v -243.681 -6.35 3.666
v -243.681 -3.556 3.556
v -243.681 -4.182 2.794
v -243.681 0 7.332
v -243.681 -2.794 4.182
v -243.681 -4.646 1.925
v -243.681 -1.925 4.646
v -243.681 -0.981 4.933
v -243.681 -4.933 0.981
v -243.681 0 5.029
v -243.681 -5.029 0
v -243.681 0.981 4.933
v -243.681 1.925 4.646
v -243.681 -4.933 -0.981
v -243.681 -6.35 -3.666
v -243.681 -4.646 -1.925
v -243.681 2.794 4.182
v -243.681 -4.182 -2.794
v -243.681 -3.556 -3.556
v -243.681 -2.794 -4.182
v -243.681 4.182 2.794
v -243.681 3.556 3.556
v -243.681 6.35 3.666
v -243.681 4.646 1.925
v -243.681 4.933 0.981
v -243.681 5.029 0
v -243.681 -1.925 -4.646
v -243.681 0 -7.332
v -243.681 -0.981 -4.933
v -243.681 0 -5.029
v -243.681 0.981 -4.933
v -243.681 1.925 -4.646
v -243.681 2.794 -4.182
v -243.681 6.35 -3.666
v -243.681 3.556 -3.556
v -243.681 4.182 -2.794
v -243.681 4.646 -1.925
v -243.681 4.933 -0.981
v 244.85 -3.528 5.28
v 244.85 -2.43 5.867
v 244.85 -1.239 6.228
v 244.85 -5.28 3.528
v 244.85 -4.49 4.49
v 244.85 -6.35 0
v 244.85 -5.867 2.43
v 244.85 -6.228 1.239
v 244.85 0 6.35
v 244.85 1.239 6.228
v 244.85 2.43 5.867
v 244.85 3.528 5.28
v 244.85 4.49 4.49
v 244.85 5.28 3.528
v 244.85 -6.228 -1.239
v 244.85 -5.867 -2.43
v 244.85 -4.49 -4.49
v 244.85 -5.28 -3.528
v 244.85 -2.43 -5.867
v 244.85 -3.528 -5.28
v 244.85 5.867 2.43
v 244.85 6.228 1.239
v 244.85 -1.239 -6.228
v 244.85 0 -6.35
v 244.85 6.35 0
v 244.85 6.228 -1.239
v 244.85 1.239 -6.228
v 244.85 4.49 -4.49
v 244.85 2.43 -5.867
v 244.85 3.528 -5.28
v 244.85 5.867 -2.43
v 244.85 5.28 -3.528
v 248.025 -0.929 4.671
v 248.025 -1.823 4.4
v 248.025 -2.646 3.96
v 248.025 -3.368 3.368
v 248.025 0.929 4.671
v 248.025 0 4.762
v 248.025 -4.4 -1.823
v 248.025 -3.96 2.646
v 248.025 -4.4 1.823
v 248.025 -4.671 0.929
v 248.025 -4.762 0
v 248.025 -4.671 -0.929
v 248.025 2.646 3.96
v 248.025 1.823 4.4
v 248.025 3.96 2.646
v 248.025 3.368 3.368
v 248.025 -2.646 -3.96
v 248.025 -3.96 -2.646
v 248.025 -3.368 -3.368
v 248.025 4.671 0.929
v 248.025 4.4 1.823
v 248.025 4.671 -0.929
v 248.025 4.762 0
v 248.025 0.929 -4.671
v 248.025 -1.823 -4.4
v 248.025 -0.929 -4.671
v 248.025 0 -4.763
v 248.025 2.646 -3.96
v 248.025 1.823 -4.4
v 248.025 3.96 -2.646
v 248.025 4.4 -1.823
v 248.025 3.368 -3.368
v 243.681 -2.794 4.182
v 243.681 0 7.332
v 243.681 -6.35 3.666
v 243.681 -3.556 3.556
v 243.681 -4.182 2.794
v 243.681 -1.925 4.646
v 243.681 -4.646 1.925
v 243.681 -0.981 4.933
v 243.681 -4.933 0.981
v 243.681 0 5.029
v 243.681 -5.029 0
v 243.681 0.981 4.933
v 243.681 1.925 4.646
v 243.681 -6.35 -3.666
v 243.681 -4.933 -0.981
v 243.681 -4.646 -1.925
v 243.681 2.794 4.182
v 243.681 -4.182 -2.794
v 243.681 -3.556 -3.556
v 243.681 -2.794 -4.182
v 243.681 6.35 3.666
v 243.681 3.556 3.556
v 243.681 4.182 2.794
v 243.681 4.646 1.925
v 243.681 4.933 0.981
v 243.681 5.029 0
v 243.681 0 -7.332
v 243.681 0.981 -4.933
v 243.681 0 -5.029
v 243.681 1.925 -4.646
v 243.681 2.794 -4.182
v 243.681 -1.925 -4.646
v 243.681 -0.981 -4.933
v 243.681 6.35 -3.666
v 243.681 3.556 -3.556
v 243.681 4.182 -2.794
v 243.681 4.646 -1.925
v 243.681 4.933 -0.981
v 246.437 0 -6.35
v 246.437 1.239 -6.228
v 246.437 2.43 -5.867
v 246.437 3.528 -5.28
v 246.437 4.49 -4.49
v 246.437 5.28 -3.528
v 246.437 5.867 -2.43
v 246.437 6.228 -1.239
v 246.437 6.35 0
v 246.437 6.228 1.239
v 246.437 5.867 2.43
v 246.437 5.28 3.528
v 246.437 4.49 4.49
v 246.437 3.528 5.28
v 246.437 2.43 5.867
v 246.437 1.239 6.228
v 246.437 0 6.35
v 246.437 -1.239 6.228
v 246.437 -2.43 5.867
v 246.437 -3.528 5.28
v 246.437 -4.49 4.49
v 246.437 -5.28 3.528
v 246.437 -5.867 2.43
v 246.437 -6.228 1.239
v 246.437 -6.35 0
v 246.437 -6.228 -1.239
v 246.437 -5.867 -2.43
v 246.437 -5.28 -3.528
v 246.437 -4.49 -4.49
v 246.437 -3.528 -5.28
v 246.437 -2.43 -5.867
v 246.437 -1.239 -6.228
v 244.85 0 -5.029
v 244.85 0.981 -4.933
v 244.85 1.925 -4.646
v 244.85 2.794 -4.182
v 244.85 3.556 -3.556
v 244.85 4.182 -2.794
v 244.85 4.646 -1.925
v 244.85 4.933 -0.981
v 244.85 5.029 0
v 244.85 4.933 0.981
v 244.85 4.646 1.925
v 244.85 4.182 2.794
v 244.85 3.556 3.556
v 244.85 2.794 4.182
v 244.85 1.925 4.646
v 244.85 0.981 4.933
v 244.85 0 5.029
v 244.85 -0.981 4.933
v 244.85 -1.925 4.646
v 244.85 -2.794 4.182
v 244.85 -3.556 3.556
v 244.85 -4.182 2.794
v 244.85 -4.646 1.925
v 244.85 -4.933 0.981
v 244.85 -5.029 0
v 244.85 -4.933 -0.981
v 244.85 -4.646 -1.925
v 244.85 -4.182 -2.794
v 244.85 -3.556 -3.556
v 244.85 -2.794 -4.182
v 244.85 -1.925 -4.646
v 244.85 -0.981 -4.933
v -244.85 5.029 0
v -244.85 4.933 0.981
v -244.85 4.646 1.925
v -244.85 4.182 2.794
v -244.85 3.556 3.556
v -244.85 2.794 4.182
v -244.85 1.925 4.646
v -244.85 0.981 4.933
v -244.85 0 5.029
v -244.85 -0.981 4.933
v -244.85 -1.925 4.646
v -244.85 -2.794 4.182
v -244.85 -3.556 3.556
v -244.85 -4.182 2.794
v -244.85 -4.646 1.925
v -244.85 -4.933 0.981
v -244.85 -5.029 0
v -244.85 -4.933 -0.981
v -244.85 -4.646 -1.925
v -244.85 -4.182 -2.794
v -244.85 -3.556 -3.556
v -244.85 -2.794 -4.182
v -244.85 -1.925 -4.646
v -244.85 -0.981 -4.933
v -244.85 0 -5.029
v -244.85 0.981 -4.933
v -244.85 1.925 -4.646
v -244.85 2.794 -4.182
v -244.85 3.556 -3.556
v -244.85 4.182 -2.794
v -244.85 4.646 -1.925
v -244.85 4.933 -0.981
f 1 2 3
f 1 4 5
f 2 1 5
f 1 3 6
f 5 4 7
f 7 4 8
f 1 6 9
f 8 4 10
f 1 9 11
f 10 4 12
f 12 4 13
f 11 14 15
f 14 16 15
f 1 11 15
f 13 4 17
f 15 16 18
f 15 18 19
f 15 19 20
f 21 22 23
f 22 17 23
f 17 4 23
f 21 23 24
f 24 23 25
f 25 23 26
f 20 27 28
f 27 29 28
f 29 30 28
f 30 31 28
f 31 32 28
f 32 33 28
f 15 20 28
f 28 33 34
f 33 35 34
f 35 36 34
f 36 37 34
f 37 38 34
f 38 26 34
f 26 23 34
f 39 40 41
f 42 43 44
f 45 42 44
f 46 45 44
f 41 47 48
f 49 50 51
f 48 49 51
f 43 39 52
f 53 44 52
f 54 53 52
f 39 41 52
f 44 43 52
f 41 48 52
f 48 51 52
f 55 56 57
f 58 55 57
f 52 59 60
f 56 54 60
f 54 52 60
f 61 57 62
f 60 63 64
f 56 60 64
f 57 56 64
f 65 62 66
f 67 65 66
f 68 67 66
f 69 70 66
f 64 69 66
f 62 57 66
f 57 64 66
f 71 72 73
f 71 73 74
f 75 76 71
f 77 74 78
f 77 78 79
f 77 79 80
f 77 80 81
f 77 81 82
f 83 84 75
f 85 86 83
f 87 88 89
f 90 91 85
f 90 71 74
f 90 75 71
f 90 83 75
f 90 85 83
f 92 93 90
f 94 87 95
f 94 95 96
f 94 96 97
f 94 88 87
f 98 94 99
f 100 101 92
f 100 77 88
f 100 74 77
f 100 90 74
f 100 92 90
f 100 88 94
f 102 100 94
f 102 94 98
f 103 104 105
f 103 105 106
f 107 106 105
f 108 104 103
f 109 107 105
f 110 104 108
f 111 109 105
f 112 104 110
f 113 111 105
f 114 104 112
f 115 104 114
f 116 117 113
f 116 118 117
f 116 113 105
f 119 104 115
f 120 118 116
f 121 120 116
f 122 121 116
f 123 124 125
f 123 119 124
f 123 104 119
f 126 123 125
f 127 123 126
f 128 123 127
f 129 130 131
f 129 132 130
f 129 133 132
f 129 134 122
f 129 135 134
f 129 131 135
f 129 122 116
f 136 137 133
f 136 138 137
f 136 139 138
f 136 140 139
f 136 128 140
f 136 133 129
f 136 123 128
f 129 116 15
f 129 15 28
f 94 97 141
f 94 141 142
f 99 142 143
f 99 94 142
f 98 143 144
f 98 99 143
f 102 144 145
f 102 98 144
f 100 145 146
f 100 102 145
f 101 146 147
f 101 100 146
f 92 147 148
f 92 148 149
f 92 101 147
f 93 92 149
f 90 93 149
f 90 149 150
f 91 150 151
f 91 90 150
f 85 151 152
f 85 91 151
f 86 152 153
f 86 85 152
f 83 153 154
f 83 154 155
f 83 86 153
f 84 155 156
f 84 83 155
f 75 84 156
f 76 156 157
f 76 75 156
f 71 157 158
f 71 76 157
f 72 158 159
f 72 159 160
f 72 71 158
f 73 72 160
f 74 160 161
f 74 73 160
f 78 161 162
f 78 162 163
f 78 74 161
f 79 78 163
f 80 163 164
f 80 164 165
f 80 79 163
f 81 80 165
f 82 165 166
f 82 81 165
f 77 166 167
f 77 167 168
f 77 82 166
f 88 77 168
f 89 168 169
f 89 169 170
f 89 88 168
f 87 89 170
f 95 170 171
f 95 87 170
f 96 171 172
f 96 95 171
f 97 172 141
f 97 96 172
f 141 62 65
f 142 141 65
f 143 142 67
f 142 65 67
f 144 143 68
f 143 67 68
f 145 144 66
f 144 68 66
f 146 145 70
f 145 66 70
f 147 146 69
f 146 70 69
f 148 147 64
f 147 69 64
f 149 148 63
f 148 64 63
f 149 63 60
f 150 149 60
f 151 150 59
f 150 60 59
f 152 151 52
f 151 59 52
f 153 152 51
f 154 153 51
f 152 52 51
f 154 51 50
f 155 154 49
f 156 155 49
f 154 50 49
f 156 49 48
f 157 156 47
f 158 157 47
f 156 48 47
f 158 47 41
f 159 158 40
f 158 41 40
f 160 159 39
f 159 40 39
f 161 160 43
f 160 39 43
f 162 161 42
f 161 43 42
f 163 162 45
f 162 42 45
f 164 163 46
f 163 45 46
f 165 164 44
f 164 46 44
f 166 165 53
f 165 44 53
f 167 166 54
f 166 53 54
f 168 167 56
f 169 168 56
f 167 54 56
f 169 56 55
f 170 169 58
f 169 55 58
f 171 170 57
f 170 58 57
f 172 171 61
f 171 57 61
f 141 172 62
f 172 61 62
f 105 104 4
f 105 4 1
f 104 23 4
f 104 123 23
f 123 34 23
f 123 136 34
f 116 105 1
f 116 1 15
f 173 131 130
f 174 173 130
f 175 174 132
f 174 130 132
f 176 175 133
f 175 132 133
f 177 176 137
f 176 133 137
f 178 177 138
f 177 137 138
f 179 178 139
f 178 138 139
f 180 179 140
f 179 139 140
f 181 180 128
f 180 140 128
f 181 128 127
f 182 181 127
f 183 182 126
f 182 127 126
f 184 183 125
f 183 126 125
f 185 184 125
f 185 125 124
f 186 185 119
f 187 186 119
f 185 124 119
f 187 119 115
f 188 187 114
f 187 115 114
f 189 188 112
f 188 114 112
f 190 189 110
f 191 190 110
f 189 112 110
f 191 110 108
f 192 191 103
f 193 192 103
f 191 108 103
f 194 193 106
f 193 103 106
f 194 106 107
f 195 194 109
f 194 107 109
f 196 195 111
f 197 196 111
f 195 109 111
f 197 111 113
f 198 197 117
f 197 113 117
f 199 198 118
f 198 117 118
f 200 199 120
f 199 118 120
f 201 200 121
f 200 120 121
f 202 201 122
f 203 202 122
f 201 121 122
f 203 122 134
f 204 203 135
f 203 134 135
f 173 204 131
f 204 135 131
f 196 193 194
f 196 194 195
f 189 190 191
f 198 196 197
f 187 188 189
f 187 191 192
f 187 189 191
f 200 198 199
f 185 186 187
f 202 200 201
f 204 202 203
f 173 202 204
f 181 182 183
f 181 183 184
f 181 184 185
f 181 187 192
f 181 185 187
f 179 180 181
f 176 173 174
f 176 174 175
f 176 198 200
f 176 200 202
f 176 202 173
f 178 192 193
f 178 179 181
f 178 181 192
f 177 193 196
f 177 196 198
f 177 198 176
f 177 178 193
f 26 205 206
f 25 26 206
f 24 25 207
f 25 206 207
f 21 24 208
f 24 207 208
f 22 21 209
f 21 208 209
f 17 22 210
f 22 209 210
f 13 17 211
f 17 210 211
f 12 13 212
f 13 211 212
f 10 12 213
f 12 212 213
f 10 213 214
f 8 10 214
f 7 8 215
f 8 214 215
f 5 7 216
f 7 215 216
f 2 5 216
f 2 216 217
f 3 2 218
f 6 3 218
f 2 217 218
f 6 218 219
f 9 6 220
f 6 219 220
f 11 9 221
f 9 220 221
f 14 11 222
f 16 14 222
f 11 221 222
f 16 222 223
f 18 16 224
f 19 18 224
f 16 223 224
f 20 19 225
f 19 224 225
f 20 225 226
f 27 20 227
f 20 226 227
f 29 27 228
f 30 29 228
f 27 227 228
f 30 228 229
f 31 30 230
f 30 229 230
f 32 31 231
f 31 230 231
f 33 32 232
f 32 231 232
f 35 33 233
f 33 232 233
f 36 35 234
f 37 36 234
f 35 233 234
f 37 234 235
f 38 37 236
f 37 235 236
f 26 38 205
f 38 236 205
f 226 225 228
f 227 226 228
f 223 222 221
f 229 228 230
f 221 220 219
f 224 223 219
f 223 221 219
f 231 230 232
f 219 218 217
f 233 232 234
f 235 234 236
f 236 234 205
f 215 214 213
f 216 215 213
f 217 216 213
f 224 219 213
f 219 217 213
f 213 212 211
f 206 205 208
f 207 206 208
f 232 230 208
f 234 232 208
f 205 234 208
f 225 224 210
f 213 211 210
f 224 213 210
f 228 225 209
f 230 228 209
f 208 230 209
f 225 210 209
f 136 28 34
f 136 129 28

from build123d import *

# Parameters (mm, degrees)
BOSS_EXTRUDE1_DEPTH = 243.68125
SKETCH2_R           = 5.0292
BOSS_EXTRUDE2_DEPTH = 1.1684
SKETCH3_R           = 6.35
BOSS_EXTRUDE3_DEPTH = 3.175
CHAMFER1_SIZE       = 1.5875
MIRROR2_START       = -244.84965
MIRROR2_OUTLINE_R   = 5.0292
MIRROR2_DEPTH       = 1.1684


# Read off the part's stored shape, not the designer's step: Mirror2
with BuildPart() as part:
    # Sketch1 → Boss-Extrude1 (new, symmetric)
    with BuildSketch(Plane(origin=(0, 0, 0), x_dir=(0, 0, -1), z_dir=(1, 0, 0))):
        Polygon((-3.666174209, 6.35), (-7.332348419, 0), (-3.666174209, -6.35), (3.666174209, -6.35), (7.332348419, 0), (3.666174209, 6.35), align=None)
    extrude(amount=BOSS_EXTRUDE1_DEPTH, both=True)

    # Sketch2 → Boss-Extrude2 (add)
    with BuildSketch(Plane(origin=(243.68125, 0, 0), x_dir=(0, 0, -1), z_dir=(1, 0, 0))):
        Circle(SKETCH2_R)
    extrude(amount=BOSS_EXTRUDE2_DEPTH)

    # Mirror2 outline → Mirror2 (add)
    with BuildSketch(Plane.YZ.offset(MIRROR2_START)):
        Circle(MIRROR2_OUTLINE_R)
    extrude(amount=MIRROR2_DEPTH)


with BuildPart() as body_2:
    # Sketch3 → Boss-Extrude3 (new body)
    with BuildSketch(Plane(origin=(244.84965, 0, 0), x_dir=(0, 0, -1), z_dir=(1, 0, 0))):
        Circle(SKETCH3_R)
    extrude(amount=BOSS_EXTRUDE3_DEPTH)

    # Chamfer1
    chamfer1_edges = [body_2.edges().sort_by_distance(p)[0] for p in [
        (248.02465, 0, 6.35),
    ]]
    chamfer(chamfer1_edges, length=CHAMFER1_SIZE)


solid = Compound([part.part, body_2.part])
